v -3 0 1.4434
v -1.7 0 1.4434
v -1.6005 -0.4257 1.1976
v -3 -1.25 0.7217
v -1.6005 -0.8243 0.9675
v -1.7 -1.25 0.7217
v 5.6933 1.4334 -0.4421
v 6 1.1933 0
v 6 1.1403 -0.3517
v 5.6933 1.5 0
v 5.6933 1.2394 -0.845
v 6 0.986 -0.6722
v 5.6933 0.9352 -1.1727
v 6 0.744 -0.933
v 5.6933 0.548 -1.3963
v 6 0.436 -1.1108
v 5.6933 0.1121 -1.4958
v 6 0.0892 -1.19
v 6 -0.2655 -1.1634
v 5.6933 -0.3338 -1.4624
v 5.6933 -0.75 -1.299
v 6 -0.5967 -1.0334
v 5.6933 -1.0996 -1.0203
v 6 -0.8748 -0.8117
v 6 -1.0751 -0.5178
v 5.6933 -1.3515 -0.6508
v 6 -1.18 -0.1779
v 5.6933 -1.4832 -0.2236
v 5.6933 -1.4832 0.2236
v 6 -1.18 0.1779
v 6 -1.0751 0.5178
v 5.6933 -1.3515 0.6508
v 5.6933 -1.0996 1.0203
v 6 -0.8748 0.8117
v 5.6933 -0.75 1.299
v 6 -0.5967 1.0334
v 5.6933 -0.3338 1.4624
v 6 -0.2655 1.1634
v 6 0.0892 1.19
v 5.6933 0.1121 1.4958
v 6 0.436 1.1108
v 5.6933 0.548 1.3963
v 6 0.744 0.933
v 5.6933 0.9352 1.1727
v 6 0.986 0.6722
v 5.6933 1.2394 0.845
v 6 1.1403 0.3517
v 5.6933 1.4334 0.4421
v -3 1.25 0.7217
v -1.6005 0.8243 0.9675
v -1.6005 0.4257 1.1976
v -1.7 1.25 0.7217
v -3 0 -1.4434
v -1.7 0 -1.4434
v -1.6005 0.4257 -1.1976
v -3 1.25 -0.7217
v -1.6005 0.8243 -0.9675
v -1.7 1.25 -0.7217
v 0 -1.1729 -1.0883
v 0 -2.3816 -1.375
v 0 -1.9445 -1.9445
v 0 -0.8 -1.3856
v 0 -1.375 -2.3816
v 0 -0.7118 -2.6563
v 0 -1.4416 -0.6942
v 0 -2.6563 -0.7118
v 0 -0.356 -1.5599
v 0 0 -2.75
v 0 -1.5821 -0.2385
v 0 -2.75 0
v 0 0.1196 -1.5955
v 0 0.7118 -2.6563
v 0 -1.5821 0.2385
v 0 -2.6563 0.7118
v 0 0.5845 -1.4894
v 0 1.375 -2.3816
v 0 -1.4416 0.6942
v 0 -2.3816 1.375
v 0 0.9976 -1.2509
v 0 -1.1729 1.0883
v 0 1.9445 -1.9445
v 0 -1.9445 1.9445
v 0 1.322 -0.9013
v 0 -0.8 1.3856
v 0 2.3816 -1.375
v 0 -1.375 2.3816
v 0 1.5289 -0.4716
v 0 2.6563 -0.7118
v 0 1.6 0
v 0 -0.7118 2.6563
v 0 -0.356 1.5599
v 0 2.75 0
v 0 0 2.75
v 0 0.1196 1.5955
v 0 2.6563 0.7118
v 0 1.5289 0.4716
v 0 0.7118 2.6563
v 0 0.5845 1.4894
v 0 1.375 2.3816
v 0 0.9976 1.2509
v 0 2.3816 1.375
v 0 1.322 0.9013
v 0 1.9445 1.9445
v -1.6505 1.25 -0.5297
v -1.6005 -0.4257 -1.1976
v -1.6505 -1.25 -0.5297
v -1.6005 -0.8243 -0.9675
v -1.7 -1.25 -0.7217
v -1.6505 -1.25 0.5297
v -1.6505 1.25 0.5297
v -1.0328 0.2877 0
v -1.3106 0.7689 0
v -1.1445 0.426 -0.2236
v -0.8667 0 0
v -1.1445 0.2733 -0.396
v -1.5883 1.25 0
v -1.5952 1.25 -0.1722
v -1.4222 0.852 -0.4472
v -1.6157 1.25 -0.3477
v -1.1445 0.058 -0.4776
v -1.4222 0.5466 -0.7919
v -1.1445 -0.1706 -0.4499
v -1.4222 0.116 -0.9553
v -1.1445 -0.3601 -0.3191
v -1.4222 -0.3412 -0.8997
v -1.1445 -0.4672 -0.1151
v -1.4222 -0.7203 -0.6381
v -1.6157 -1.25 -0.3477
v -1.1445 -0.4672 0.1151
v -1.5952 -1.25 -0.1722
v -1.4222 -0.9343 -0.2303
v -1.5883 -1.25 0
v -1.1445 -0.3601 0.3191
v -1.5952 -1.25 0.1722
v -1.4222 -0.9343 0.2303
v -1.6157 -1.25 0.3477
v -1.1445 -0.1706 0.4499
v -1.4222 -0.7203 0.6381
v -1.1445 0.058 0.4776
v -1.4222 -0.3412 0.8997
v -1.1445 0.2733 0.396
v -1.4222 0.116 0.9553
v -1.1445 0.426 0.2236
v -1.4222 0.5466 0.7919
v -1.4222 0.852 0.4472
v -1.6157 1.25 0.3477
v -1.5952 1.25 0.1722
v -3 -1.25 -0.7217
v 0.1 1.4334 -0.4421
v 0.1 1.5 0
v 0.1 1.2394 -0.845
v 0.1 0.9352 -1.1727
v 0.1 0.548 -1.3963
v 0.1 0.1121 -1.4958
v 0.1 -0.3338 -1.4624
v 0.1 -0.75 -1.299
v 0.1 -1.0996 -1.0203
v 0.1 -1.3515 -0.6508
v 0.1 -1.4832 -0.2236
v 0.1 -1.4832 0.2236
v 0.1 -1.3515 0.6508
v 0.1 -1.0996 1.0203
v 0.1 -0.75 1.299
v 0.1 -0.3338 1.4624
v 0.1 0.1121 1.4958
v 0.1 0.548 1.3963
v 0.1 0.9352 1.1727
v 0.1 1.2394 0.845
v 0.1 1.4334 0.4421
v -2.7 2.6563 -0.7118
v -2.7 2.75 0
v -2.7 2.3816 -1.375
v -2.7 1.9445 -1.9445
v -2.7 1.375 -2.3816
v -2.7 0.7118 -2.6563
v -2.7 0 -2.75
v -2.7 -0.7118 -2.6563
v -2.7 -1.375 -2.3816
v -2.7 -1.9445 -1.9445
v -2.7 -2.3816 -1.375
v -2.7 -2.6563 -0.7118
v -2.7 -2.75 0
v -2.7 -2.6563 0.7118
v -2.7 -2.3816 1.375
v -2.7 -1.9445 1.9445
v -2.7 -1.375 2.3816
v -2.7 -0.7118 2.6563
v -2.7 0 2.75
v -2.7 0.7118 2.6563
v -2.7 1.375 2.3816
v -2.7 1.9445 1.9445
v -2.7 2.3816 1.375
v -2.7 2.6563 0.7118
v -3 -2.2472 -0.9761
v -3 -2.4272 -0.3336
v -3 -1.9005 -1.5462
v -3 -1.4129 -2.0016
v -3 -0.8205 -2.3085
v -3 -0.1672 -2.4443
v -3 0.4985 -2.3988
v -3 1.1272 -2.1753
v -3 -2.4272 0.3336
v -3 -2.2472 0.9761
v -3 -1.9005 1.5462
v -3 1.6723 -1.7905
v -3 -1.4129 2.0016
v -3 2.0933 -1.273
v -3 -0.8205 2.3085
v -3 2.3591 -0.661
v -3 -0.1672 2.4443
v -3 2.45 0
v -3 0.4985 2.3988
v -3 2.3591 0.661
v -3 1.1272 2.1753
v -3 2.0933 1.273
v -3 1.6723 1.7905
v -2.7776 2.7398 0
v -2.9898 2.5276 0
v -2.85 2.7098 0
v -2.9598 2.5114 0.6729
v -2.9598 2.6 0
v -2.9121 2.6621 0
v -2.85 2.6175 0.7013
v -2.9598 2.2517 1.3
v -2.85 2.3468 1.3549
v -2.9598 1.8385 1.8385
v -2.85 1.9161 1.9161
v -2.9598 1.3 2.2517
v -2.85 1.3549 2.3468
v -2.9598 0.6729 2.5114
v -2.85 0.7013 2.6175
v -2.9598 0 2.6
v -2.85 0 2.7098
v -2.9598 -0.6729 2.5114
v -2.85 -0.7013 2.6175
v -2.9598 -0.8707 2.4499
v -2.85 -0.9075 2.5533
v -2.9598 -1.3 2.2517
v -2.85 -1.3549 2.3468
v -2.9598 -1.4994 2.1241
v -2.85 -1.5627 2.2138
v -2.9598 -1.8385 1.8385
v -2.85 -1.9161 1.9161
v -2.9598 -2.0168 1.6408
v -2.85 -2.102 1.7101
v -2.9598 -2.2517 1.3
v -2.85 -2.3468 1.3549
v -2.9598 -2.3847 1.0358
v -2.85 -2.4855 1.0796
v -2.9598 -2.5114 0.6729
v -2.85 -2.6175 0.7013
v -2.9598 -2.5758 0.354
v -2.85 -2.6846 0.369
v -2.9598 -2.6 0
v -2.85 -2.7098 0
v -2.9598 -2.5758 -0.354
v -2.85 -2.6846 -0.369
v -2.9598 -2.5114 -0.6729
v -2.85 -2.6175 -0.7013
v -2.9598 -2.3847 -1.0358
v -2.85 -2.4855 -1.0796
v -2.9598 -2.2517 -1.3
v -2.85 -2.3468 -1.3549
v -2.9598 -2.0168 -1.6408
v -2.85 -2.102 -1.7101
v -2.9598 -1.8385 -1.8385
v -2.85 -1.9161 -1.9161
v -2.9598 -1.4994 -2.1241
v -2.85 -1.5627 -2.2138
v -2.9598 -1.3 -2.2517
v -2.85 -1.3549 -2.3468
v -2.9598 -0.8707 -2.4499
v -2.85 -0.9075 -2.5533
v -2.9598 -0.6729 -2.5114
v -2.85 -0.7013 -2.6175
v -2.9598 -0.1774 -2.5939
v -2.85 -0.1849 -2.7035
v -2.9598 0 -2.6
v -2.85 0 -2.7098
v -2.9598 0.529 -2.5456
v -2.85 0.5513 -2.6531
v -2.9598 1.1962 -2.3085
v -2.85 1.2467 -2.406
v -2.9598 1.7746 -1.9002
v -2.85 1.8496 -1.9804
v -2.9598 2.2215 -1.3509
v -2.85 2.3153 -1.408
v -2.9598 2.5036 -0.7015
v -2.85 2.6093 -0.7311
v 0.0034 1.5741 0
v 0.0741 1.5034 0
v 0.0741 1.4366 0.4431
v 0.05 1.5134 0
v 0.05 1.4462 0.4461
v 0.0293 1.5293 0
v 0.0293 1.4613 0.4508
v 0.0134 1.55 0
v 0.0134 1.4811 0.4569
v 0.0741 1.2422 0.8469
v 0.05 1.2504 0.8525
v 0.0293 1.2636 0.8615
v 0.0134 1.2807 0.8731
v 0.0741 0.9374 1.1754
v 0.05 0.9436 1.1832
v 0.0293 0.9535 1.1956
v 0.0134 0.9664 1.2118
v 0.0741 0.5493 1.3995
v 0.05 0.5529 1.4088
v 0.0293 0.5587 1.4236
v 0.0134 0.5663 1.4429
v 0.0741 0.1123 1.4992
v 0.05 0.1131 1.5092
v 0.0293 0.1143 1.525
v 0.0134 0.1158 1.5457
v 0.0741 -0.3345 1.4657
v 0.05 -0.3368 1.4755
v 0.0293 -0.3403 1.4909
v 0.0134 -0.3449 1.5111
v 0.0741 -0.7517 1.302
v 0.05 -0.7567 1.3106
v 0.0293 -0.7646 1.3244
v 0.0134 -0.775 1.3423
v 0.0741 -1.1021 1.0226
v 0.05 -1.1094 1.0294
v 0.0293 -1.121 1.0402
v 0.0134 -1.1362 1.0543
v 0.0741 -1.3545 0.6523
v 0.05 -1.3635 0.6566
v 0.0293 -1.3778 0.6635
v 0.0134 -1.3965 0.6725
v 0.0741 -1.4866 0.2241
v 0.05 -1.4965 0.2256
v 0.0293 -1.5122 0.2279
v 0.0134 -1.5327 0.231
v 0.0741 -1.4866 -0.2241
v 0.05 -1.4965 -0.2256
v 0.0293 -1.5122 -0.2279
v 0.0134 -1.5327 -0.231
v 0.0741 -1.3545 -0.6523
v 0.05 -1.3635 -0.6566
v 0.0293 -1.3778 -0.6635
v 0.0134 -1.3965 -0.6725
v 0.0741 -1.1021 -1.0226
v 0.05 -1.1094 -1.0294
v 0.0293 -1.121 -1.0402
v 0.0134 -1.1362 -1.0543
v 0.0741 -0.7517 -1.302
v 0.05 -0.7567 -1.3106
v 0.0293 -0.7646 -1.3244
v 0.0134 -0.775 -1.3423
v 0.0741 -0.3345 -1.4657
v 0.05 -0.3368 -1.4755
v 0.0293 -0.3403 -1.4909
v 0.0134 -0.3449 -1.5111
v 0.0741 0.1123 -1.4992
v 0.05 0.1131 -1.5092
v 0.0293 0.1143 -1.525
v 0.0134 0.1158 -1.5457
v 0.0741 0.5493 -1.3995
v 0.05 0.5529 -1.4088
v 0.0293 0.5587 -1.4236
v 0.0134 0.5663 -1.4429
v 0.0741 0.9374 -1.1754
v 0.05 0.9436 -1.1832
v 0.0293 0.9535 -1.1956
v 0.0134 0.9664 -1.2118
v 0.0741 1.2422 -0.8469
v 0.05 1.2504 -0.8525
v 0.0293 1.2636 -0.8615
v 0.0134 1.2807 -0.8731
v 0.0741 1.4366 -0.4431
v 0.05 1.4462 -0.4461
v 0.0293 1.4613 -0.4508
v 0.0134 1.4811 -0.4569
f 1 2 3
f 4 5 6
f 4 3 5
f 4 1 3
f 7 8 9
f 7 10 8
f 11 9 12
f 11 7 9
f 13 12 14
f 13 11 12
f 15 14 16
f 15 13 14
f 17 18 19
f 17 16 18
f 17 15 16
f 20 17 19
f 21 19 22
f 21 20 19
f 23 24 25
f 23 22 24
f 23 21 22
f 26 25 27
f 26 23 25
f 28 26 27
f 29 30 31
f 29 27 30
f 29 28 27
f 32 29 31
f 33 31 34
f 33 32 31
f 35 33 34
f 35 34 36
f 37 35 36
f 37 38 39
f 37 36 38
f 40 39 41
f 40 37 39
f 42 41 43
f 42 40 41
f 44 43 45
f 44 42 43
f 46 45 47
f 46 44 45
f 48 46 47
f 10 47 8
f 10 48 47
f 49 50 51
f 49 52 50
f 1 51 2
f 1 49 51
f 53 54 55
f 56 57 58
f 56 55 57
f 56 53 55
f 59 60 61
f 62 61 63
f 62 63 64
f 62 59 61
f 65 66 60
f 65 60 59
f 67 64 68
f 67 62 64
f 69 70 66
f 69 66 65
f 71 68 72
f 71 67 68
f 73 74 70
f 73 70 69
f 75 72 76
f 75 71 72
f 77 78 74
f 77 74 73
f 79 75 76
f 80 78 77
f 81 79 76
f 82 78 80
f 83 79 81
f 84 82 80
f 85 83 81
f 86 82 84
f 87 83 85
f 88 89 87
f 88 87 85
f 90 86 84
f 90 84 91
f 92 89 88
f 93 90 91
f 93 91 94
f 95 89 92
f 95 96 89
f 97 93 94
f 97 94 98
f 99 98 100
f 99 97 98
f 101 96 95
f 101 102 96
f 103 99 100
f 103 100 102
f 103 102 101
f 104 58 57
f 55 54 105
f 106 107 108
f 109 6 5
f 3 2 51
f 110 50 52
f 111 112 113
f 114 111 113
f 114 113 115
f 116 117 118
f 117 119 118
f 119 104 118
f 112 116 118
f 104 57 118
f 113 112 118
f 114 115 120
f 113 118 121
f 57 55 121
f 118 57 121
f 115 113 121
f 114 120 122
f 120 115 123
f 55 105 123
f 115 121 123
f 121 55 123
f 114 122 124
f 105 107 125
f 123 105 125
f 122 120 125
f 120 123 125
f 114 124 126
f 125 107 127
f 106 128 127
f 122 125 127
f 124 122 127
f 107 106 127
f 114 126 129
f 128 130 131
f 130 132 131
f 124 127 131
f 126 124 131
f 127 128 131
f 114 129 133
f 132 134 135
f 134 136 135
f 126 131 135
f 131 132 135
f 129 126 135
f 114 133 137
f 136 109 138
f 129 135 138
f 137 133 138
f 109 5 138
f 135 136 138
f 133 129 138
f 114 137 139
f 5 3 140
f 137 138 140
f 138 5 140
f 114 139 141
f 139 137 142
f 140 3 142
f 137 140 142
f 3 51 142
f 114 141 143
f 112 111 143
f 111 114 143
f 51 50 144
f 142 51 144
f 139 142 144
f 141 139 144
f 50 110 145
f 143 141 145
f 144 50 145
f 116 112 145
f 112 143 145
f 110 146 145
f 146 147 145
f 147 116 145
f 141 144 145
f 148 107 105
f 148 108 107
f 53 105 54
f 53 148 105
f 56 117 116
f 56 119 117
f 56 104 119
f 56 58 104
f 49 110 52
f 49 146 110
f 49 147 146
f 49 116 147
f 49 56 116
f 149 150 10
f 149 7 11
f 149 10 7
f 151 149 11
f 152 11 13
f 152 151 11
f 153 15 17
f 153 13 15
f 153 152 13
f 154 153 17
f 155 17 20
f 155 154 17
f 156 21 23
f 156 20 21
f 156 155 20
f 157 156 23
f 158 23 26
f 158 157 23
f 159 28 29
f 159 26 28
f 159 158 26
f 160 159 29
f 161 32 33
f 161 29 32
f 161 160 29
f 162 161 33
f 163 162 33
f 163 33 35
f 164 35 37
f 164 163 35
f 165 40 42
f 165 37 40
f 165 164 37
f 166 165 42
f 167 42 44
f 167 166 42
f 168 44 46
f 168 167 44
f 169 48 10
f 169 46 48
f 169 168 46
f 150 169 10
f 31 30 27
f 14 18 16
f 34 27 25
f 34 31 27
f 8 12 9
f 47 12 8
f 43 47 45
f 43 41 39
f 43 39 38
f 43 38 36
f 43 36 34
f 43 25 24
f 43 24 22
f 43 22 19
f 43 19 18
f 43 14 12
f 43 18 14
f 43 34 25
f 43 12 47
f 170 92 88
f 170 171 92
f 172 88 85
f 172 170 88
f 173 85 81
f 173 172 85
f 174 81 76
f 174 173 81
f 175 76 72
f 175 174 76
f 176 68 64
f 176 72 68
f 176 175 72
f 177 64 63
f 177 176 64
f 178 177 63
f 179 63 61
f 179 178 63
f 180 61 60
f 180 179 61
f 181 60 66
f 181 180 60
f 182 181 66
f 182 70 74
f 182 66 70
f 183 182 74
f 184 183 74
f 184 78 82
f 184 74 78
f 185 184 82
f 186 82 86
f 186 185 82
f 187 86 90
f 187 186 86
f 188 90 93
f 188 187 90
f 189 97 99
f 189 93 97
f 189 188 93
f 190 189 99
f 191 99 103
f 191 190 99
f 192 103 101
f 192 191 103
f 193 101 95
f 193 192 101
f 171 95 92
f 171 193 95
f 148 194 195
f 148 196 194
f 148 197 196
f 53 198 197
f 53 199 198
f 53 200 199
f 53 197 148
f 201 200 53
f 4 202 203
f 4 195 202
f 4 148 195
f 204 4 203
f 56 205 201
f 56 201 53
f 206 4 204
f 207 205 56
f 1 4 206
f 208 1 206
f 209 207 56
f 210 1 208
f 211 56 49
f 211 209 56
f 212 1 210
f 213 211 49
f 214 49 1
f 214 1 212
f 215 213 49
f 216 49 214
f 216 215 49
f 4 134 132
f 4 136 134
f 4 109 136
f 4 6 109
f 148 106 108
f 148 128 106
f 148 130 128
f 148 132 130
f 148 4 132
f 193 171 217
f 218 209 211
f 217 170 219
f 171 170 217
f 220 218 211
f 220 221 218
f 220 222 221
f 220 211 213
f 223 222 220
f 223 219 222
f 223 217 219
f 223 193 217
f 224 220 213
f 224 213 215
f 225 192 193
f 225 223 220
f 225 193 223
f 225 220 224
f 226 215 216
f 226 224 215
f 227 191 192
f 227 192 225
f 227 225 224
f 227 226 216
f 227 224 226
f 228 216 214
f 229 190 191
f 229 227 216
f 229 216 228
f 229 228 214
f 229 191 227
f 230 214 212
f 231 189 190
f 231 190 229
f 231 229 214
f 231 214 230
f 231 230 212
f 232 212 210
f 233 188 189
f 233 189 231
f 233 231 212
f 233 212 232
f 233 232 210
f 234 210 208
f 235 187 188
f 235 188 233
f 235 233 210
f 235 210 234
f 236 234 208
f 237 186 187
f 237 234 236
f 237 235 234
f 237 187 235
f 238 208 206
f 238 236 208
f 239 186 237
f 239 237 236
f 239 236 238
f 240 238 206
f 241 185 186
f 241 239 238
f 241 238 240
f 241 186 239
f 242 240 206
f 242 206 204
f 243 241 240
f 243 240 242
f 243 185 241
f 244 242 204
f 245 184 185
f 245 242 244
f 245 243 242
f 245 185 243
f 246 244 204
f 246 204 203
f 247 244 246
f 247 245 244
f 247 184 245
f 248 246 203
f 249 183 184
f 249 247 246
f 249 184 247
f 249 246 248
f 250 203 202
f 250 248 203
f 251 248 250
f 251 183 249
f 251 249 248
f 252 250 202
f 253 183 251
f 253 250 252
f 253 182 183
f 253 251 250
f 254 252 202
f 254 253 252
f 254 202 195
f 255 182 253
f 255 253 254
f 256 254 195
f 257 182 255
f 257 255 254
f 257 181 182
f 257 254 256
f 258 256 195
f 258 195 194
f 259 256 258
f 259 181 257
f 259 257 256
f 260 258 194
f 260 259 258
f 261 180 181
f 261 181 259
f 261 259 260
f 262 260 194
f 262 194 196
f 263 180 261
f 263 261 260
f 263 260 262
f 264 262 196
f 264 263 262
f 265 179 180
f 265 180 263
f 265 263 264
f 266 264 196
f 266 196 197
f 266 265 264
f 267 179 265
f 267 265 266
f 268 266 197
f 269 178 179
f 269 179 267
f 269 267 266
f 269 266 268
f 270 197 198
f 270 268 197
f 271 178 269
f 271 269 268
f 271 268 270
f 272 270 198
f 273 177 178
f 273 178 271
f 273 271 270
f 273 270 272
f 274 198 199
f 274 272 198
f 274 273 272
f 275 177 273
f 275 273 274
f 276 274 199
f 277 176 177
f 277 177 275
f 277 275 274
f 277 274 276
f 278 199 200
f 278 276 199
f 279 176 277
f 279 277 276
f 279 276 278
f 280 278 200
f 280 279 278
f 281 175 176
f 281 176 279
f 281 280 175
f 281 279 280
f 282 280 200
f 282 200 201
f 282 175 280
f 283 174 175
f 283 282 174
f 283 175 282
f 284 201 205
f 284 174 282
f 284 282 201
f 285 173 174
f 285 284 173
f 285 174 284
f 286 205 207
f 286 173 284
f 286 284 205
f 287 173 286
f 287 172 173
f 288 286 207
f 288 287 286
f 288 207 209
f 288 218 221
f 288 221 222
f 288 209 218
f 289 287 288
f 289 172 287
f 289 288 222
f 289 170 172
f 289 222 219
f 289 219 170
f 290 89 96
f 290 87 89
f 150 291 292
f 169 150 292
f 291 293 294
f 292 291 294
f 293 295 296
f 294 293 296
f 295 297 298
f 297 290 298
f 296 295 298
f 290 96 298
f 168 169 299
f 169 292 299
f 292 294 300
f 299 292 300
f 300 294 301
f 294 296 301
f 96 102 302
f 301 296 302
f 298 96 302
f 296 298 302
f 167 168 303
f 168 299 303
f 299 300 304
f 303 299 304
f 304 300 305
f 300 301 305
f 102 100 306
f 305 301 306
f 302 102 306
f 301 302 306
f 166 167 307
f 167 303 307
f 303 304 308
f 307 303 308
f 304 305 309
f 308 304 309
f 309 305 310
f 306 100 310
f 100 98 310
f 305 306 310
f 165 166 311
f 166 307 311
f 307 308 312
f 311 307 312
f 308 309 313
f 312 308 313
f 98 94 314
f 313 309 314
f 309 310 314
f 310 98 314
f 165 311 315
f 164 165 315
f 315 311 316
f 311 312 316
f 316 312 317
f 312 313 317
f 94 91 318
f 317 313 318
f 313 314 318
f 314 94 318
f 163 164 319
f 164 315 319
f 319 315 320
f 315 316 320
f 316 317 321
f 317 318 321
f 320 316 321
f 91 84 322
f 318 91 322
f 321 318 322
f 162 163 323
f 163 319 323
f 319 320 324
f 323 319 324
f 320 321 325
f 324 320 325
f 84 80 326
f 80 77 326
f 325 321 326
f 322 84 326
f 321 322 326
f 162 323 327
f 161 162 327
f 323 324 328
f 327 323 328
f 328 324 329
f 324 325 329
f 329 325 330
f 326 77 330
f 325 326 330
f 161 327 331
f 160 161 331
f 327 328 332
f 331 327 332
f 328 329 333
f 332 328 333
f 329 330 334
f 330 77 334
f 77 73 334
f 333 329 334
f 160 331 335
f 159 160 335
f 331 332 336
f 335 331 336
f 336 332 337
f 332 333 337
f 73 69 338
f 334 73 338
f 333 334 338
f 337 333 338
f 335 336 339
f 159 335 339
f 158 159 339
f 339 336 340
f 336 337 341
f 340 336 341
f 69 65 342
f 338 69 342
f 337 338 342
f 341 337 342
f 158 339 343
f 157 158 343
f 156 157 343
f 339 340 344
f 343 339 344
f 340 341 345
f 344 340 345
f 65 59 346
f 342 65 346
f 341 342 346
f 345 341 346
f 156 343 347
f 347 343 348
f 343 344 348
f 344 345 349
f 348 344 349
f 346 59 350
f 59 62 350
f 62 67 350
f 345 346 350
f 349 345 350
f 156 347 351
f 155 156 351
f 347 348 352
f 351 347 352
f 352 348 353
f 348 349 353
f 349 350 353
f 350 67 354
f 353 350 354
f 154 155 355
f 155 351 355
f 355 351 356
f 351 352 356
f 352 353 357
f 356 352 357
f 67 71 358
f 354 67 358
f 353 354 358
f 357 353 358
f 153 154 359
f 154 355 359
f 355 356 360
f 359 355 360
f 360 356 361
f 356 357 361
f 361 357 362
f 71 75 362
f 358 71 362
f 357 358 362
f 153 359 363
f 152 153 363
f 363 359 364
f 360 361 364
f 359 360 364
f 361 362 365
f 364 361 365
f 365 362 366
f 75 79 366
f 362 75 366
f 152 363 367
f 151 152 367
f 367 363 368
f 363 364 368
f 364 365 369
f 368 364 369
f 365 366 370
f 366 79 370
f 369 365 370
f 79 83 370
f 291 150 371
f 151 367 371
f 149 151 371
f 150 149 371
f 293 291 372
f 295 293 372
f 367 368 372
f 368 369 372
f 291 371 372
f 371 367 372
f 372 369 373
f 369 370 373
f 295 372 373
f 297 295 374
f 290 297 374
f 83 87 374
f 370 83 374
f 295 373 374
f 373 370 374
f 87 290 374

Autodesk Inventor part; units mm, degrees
ref_plane "YZ Plane" through (0, 0, 0) normal (1, 0, 0) x (0, 1, 0)
ref_plane "XZ Plane" through (0, 0, 0) normal (0, 1, 0) x (-1, 0, 0)
sketch "Sketch1" plane through (0, 0, 0) normal (0, 0, 1) x (1, 0, 0)
  line L0 (-0.8667, 0) -> (6, 0)
  line L1 (6, 0) -> (6, 1.5)
  line L2 (6, 1.5) -> (1.5, 1.5)
  line L3 (1.5, 1.5) -> (1.1932, 1.5)
  line L4 (1.1932, 1.5) -> (0, 1.5)
  line L5 (0, 1.5) -> (0, 2.75)
  line L6 (0, 2.75) -> (-3, 2.75)
  line L7 (-3, 2.75) -> (-3, 1.4434)
  line L8 (-3, 1.4434) -> (-1.7, 1.4434)
  line L9 (-1.7, 1.4434) -> (-0.8667, 0)
  line L10 (-4.8, 0) -> (7.8, 0) projected
  line L11 (0, -0.55) -> (0, 3.3) projected
  line L12 (1.5, 1.5) -> (0, 1.5) construction
  dimension "d1" = 4.5
  dimension "d2" = 0.3068
  dimension "d3" = 3
  dimension "d4" = 1.3
  dimension "d5" = 60
  dimension "d6" = 3
  dimension "d7" = 3
  dimension "d8" = 2.8868
  dimension "d9" = 5.5
  dimension "d26" = 6
revolve "Body" add sketch "Sketch1" angle 360 about axis through (-0.8667, 0, 0) along (1, 0, 0)
sketch "Sketch2" plane through (-3, 0, 0) normal (-1, 0, 0) x (0, 0, 1)
  circle A0 centre (0, 0) radius 1.4434 projected
  line L0 (0, -3.85) -> (0, 3.85) projected
  line L1 (-3.85, 0) -> (3.85, 0) projected
  line L2 (1.4434, 0) -> (0.7217, -1.25)
  line L3 (0.7217, -1.25) -> (-0.7217, -1.25)
  line L4 (-0.7217, -1.25) -> (-1.4434, 0)
  line L5 (-1.4434, 0) -> (-0.7217, 1.25)
  line L6 (-0.7217, 1.25) -> (0.7217, 1.25)
  line L7 (0.7217, 1.25) -> (1.4434, 0)
  point P0 (0, 0)
extrude "Slot" add sketch "Sketch2" against normal up to next contours L7 A0 | A0 L2 | L6 L0 A0 | A0 L0 L3 | L0 L6 A0 | A0 L3 L0 | L4 A0 | A0 L5
fillet "Fillet1" radius 0.3 1 edges at (-3, -2.75, 0)
thread "Thread" size "M3x0.5" class "6g" standard "ISO Metric profile" length 4.5
chamfer "Chamfer1" distance 0.3067 distance2 0.3067 1 edges at (6, -1.5, 0) measured on face at (6, -0.2617, -0.7882)
ref_plane "Work Plane1" through (29, 0, 0) normal (0, -1, 0) x (1, 0, 0)
fillet "Fillet2" radius 0.1 1 edges at (0, -1.5, 0)
equation "\"d1\" = GEL"
equation "\"d3\" = KOH"
equation "\"d4\" = INTI"
equation "\"d6\" = GD"
equation "\"d7\" = BDM"
equation "\"d8\" = 1.1547 * SW"
equation "\"d9\" = KOD"
equation "\"d26\" = NLG"
equation "\"d30\" = R"
equation "\"d17\" = RR"
equation "\"d13\" = GEL"
equation "\"d15\" = -0.5 * SPD + 0.5 * GD"
equation "\"d16\" = GUL"
equation "\"GD\" = 3"
equation "\"NLG\" = 6"
equation "\"GEL\" = 4.5"
equation "\"KOD\" = 5.5"
equation "\"KOH\" = 3"
equation "\"INTI\" = 1.3"
equation "\"GAL\" = 0.61345 * PTC"
equation "\"GUL\" = 0.61345 * PTC"
equation "\"BDM\" = NND"
equation "\"SW\" = 2.5"
equation "\"RR\" = 0.3"
equation "\"SPD\" = NND - 1.2269 * PTC"
equation "\"R\" = 0.1"
equation "\"TOA\" = 30deg"
equation "\"GD1\" = THREADDIA - 1.2269 * PTC"
equation "\"THREADDIA\" = 3"
equation "\"FAWI\" = 45deg"
equation "\"PTC\" = 0.5"
equation "\"NND\" = 3"
equation "\"E0\" = 1.155 * SW"
properties part number "ISO 4762  - M3 x 6" material "Stainless Steel, 440C"
